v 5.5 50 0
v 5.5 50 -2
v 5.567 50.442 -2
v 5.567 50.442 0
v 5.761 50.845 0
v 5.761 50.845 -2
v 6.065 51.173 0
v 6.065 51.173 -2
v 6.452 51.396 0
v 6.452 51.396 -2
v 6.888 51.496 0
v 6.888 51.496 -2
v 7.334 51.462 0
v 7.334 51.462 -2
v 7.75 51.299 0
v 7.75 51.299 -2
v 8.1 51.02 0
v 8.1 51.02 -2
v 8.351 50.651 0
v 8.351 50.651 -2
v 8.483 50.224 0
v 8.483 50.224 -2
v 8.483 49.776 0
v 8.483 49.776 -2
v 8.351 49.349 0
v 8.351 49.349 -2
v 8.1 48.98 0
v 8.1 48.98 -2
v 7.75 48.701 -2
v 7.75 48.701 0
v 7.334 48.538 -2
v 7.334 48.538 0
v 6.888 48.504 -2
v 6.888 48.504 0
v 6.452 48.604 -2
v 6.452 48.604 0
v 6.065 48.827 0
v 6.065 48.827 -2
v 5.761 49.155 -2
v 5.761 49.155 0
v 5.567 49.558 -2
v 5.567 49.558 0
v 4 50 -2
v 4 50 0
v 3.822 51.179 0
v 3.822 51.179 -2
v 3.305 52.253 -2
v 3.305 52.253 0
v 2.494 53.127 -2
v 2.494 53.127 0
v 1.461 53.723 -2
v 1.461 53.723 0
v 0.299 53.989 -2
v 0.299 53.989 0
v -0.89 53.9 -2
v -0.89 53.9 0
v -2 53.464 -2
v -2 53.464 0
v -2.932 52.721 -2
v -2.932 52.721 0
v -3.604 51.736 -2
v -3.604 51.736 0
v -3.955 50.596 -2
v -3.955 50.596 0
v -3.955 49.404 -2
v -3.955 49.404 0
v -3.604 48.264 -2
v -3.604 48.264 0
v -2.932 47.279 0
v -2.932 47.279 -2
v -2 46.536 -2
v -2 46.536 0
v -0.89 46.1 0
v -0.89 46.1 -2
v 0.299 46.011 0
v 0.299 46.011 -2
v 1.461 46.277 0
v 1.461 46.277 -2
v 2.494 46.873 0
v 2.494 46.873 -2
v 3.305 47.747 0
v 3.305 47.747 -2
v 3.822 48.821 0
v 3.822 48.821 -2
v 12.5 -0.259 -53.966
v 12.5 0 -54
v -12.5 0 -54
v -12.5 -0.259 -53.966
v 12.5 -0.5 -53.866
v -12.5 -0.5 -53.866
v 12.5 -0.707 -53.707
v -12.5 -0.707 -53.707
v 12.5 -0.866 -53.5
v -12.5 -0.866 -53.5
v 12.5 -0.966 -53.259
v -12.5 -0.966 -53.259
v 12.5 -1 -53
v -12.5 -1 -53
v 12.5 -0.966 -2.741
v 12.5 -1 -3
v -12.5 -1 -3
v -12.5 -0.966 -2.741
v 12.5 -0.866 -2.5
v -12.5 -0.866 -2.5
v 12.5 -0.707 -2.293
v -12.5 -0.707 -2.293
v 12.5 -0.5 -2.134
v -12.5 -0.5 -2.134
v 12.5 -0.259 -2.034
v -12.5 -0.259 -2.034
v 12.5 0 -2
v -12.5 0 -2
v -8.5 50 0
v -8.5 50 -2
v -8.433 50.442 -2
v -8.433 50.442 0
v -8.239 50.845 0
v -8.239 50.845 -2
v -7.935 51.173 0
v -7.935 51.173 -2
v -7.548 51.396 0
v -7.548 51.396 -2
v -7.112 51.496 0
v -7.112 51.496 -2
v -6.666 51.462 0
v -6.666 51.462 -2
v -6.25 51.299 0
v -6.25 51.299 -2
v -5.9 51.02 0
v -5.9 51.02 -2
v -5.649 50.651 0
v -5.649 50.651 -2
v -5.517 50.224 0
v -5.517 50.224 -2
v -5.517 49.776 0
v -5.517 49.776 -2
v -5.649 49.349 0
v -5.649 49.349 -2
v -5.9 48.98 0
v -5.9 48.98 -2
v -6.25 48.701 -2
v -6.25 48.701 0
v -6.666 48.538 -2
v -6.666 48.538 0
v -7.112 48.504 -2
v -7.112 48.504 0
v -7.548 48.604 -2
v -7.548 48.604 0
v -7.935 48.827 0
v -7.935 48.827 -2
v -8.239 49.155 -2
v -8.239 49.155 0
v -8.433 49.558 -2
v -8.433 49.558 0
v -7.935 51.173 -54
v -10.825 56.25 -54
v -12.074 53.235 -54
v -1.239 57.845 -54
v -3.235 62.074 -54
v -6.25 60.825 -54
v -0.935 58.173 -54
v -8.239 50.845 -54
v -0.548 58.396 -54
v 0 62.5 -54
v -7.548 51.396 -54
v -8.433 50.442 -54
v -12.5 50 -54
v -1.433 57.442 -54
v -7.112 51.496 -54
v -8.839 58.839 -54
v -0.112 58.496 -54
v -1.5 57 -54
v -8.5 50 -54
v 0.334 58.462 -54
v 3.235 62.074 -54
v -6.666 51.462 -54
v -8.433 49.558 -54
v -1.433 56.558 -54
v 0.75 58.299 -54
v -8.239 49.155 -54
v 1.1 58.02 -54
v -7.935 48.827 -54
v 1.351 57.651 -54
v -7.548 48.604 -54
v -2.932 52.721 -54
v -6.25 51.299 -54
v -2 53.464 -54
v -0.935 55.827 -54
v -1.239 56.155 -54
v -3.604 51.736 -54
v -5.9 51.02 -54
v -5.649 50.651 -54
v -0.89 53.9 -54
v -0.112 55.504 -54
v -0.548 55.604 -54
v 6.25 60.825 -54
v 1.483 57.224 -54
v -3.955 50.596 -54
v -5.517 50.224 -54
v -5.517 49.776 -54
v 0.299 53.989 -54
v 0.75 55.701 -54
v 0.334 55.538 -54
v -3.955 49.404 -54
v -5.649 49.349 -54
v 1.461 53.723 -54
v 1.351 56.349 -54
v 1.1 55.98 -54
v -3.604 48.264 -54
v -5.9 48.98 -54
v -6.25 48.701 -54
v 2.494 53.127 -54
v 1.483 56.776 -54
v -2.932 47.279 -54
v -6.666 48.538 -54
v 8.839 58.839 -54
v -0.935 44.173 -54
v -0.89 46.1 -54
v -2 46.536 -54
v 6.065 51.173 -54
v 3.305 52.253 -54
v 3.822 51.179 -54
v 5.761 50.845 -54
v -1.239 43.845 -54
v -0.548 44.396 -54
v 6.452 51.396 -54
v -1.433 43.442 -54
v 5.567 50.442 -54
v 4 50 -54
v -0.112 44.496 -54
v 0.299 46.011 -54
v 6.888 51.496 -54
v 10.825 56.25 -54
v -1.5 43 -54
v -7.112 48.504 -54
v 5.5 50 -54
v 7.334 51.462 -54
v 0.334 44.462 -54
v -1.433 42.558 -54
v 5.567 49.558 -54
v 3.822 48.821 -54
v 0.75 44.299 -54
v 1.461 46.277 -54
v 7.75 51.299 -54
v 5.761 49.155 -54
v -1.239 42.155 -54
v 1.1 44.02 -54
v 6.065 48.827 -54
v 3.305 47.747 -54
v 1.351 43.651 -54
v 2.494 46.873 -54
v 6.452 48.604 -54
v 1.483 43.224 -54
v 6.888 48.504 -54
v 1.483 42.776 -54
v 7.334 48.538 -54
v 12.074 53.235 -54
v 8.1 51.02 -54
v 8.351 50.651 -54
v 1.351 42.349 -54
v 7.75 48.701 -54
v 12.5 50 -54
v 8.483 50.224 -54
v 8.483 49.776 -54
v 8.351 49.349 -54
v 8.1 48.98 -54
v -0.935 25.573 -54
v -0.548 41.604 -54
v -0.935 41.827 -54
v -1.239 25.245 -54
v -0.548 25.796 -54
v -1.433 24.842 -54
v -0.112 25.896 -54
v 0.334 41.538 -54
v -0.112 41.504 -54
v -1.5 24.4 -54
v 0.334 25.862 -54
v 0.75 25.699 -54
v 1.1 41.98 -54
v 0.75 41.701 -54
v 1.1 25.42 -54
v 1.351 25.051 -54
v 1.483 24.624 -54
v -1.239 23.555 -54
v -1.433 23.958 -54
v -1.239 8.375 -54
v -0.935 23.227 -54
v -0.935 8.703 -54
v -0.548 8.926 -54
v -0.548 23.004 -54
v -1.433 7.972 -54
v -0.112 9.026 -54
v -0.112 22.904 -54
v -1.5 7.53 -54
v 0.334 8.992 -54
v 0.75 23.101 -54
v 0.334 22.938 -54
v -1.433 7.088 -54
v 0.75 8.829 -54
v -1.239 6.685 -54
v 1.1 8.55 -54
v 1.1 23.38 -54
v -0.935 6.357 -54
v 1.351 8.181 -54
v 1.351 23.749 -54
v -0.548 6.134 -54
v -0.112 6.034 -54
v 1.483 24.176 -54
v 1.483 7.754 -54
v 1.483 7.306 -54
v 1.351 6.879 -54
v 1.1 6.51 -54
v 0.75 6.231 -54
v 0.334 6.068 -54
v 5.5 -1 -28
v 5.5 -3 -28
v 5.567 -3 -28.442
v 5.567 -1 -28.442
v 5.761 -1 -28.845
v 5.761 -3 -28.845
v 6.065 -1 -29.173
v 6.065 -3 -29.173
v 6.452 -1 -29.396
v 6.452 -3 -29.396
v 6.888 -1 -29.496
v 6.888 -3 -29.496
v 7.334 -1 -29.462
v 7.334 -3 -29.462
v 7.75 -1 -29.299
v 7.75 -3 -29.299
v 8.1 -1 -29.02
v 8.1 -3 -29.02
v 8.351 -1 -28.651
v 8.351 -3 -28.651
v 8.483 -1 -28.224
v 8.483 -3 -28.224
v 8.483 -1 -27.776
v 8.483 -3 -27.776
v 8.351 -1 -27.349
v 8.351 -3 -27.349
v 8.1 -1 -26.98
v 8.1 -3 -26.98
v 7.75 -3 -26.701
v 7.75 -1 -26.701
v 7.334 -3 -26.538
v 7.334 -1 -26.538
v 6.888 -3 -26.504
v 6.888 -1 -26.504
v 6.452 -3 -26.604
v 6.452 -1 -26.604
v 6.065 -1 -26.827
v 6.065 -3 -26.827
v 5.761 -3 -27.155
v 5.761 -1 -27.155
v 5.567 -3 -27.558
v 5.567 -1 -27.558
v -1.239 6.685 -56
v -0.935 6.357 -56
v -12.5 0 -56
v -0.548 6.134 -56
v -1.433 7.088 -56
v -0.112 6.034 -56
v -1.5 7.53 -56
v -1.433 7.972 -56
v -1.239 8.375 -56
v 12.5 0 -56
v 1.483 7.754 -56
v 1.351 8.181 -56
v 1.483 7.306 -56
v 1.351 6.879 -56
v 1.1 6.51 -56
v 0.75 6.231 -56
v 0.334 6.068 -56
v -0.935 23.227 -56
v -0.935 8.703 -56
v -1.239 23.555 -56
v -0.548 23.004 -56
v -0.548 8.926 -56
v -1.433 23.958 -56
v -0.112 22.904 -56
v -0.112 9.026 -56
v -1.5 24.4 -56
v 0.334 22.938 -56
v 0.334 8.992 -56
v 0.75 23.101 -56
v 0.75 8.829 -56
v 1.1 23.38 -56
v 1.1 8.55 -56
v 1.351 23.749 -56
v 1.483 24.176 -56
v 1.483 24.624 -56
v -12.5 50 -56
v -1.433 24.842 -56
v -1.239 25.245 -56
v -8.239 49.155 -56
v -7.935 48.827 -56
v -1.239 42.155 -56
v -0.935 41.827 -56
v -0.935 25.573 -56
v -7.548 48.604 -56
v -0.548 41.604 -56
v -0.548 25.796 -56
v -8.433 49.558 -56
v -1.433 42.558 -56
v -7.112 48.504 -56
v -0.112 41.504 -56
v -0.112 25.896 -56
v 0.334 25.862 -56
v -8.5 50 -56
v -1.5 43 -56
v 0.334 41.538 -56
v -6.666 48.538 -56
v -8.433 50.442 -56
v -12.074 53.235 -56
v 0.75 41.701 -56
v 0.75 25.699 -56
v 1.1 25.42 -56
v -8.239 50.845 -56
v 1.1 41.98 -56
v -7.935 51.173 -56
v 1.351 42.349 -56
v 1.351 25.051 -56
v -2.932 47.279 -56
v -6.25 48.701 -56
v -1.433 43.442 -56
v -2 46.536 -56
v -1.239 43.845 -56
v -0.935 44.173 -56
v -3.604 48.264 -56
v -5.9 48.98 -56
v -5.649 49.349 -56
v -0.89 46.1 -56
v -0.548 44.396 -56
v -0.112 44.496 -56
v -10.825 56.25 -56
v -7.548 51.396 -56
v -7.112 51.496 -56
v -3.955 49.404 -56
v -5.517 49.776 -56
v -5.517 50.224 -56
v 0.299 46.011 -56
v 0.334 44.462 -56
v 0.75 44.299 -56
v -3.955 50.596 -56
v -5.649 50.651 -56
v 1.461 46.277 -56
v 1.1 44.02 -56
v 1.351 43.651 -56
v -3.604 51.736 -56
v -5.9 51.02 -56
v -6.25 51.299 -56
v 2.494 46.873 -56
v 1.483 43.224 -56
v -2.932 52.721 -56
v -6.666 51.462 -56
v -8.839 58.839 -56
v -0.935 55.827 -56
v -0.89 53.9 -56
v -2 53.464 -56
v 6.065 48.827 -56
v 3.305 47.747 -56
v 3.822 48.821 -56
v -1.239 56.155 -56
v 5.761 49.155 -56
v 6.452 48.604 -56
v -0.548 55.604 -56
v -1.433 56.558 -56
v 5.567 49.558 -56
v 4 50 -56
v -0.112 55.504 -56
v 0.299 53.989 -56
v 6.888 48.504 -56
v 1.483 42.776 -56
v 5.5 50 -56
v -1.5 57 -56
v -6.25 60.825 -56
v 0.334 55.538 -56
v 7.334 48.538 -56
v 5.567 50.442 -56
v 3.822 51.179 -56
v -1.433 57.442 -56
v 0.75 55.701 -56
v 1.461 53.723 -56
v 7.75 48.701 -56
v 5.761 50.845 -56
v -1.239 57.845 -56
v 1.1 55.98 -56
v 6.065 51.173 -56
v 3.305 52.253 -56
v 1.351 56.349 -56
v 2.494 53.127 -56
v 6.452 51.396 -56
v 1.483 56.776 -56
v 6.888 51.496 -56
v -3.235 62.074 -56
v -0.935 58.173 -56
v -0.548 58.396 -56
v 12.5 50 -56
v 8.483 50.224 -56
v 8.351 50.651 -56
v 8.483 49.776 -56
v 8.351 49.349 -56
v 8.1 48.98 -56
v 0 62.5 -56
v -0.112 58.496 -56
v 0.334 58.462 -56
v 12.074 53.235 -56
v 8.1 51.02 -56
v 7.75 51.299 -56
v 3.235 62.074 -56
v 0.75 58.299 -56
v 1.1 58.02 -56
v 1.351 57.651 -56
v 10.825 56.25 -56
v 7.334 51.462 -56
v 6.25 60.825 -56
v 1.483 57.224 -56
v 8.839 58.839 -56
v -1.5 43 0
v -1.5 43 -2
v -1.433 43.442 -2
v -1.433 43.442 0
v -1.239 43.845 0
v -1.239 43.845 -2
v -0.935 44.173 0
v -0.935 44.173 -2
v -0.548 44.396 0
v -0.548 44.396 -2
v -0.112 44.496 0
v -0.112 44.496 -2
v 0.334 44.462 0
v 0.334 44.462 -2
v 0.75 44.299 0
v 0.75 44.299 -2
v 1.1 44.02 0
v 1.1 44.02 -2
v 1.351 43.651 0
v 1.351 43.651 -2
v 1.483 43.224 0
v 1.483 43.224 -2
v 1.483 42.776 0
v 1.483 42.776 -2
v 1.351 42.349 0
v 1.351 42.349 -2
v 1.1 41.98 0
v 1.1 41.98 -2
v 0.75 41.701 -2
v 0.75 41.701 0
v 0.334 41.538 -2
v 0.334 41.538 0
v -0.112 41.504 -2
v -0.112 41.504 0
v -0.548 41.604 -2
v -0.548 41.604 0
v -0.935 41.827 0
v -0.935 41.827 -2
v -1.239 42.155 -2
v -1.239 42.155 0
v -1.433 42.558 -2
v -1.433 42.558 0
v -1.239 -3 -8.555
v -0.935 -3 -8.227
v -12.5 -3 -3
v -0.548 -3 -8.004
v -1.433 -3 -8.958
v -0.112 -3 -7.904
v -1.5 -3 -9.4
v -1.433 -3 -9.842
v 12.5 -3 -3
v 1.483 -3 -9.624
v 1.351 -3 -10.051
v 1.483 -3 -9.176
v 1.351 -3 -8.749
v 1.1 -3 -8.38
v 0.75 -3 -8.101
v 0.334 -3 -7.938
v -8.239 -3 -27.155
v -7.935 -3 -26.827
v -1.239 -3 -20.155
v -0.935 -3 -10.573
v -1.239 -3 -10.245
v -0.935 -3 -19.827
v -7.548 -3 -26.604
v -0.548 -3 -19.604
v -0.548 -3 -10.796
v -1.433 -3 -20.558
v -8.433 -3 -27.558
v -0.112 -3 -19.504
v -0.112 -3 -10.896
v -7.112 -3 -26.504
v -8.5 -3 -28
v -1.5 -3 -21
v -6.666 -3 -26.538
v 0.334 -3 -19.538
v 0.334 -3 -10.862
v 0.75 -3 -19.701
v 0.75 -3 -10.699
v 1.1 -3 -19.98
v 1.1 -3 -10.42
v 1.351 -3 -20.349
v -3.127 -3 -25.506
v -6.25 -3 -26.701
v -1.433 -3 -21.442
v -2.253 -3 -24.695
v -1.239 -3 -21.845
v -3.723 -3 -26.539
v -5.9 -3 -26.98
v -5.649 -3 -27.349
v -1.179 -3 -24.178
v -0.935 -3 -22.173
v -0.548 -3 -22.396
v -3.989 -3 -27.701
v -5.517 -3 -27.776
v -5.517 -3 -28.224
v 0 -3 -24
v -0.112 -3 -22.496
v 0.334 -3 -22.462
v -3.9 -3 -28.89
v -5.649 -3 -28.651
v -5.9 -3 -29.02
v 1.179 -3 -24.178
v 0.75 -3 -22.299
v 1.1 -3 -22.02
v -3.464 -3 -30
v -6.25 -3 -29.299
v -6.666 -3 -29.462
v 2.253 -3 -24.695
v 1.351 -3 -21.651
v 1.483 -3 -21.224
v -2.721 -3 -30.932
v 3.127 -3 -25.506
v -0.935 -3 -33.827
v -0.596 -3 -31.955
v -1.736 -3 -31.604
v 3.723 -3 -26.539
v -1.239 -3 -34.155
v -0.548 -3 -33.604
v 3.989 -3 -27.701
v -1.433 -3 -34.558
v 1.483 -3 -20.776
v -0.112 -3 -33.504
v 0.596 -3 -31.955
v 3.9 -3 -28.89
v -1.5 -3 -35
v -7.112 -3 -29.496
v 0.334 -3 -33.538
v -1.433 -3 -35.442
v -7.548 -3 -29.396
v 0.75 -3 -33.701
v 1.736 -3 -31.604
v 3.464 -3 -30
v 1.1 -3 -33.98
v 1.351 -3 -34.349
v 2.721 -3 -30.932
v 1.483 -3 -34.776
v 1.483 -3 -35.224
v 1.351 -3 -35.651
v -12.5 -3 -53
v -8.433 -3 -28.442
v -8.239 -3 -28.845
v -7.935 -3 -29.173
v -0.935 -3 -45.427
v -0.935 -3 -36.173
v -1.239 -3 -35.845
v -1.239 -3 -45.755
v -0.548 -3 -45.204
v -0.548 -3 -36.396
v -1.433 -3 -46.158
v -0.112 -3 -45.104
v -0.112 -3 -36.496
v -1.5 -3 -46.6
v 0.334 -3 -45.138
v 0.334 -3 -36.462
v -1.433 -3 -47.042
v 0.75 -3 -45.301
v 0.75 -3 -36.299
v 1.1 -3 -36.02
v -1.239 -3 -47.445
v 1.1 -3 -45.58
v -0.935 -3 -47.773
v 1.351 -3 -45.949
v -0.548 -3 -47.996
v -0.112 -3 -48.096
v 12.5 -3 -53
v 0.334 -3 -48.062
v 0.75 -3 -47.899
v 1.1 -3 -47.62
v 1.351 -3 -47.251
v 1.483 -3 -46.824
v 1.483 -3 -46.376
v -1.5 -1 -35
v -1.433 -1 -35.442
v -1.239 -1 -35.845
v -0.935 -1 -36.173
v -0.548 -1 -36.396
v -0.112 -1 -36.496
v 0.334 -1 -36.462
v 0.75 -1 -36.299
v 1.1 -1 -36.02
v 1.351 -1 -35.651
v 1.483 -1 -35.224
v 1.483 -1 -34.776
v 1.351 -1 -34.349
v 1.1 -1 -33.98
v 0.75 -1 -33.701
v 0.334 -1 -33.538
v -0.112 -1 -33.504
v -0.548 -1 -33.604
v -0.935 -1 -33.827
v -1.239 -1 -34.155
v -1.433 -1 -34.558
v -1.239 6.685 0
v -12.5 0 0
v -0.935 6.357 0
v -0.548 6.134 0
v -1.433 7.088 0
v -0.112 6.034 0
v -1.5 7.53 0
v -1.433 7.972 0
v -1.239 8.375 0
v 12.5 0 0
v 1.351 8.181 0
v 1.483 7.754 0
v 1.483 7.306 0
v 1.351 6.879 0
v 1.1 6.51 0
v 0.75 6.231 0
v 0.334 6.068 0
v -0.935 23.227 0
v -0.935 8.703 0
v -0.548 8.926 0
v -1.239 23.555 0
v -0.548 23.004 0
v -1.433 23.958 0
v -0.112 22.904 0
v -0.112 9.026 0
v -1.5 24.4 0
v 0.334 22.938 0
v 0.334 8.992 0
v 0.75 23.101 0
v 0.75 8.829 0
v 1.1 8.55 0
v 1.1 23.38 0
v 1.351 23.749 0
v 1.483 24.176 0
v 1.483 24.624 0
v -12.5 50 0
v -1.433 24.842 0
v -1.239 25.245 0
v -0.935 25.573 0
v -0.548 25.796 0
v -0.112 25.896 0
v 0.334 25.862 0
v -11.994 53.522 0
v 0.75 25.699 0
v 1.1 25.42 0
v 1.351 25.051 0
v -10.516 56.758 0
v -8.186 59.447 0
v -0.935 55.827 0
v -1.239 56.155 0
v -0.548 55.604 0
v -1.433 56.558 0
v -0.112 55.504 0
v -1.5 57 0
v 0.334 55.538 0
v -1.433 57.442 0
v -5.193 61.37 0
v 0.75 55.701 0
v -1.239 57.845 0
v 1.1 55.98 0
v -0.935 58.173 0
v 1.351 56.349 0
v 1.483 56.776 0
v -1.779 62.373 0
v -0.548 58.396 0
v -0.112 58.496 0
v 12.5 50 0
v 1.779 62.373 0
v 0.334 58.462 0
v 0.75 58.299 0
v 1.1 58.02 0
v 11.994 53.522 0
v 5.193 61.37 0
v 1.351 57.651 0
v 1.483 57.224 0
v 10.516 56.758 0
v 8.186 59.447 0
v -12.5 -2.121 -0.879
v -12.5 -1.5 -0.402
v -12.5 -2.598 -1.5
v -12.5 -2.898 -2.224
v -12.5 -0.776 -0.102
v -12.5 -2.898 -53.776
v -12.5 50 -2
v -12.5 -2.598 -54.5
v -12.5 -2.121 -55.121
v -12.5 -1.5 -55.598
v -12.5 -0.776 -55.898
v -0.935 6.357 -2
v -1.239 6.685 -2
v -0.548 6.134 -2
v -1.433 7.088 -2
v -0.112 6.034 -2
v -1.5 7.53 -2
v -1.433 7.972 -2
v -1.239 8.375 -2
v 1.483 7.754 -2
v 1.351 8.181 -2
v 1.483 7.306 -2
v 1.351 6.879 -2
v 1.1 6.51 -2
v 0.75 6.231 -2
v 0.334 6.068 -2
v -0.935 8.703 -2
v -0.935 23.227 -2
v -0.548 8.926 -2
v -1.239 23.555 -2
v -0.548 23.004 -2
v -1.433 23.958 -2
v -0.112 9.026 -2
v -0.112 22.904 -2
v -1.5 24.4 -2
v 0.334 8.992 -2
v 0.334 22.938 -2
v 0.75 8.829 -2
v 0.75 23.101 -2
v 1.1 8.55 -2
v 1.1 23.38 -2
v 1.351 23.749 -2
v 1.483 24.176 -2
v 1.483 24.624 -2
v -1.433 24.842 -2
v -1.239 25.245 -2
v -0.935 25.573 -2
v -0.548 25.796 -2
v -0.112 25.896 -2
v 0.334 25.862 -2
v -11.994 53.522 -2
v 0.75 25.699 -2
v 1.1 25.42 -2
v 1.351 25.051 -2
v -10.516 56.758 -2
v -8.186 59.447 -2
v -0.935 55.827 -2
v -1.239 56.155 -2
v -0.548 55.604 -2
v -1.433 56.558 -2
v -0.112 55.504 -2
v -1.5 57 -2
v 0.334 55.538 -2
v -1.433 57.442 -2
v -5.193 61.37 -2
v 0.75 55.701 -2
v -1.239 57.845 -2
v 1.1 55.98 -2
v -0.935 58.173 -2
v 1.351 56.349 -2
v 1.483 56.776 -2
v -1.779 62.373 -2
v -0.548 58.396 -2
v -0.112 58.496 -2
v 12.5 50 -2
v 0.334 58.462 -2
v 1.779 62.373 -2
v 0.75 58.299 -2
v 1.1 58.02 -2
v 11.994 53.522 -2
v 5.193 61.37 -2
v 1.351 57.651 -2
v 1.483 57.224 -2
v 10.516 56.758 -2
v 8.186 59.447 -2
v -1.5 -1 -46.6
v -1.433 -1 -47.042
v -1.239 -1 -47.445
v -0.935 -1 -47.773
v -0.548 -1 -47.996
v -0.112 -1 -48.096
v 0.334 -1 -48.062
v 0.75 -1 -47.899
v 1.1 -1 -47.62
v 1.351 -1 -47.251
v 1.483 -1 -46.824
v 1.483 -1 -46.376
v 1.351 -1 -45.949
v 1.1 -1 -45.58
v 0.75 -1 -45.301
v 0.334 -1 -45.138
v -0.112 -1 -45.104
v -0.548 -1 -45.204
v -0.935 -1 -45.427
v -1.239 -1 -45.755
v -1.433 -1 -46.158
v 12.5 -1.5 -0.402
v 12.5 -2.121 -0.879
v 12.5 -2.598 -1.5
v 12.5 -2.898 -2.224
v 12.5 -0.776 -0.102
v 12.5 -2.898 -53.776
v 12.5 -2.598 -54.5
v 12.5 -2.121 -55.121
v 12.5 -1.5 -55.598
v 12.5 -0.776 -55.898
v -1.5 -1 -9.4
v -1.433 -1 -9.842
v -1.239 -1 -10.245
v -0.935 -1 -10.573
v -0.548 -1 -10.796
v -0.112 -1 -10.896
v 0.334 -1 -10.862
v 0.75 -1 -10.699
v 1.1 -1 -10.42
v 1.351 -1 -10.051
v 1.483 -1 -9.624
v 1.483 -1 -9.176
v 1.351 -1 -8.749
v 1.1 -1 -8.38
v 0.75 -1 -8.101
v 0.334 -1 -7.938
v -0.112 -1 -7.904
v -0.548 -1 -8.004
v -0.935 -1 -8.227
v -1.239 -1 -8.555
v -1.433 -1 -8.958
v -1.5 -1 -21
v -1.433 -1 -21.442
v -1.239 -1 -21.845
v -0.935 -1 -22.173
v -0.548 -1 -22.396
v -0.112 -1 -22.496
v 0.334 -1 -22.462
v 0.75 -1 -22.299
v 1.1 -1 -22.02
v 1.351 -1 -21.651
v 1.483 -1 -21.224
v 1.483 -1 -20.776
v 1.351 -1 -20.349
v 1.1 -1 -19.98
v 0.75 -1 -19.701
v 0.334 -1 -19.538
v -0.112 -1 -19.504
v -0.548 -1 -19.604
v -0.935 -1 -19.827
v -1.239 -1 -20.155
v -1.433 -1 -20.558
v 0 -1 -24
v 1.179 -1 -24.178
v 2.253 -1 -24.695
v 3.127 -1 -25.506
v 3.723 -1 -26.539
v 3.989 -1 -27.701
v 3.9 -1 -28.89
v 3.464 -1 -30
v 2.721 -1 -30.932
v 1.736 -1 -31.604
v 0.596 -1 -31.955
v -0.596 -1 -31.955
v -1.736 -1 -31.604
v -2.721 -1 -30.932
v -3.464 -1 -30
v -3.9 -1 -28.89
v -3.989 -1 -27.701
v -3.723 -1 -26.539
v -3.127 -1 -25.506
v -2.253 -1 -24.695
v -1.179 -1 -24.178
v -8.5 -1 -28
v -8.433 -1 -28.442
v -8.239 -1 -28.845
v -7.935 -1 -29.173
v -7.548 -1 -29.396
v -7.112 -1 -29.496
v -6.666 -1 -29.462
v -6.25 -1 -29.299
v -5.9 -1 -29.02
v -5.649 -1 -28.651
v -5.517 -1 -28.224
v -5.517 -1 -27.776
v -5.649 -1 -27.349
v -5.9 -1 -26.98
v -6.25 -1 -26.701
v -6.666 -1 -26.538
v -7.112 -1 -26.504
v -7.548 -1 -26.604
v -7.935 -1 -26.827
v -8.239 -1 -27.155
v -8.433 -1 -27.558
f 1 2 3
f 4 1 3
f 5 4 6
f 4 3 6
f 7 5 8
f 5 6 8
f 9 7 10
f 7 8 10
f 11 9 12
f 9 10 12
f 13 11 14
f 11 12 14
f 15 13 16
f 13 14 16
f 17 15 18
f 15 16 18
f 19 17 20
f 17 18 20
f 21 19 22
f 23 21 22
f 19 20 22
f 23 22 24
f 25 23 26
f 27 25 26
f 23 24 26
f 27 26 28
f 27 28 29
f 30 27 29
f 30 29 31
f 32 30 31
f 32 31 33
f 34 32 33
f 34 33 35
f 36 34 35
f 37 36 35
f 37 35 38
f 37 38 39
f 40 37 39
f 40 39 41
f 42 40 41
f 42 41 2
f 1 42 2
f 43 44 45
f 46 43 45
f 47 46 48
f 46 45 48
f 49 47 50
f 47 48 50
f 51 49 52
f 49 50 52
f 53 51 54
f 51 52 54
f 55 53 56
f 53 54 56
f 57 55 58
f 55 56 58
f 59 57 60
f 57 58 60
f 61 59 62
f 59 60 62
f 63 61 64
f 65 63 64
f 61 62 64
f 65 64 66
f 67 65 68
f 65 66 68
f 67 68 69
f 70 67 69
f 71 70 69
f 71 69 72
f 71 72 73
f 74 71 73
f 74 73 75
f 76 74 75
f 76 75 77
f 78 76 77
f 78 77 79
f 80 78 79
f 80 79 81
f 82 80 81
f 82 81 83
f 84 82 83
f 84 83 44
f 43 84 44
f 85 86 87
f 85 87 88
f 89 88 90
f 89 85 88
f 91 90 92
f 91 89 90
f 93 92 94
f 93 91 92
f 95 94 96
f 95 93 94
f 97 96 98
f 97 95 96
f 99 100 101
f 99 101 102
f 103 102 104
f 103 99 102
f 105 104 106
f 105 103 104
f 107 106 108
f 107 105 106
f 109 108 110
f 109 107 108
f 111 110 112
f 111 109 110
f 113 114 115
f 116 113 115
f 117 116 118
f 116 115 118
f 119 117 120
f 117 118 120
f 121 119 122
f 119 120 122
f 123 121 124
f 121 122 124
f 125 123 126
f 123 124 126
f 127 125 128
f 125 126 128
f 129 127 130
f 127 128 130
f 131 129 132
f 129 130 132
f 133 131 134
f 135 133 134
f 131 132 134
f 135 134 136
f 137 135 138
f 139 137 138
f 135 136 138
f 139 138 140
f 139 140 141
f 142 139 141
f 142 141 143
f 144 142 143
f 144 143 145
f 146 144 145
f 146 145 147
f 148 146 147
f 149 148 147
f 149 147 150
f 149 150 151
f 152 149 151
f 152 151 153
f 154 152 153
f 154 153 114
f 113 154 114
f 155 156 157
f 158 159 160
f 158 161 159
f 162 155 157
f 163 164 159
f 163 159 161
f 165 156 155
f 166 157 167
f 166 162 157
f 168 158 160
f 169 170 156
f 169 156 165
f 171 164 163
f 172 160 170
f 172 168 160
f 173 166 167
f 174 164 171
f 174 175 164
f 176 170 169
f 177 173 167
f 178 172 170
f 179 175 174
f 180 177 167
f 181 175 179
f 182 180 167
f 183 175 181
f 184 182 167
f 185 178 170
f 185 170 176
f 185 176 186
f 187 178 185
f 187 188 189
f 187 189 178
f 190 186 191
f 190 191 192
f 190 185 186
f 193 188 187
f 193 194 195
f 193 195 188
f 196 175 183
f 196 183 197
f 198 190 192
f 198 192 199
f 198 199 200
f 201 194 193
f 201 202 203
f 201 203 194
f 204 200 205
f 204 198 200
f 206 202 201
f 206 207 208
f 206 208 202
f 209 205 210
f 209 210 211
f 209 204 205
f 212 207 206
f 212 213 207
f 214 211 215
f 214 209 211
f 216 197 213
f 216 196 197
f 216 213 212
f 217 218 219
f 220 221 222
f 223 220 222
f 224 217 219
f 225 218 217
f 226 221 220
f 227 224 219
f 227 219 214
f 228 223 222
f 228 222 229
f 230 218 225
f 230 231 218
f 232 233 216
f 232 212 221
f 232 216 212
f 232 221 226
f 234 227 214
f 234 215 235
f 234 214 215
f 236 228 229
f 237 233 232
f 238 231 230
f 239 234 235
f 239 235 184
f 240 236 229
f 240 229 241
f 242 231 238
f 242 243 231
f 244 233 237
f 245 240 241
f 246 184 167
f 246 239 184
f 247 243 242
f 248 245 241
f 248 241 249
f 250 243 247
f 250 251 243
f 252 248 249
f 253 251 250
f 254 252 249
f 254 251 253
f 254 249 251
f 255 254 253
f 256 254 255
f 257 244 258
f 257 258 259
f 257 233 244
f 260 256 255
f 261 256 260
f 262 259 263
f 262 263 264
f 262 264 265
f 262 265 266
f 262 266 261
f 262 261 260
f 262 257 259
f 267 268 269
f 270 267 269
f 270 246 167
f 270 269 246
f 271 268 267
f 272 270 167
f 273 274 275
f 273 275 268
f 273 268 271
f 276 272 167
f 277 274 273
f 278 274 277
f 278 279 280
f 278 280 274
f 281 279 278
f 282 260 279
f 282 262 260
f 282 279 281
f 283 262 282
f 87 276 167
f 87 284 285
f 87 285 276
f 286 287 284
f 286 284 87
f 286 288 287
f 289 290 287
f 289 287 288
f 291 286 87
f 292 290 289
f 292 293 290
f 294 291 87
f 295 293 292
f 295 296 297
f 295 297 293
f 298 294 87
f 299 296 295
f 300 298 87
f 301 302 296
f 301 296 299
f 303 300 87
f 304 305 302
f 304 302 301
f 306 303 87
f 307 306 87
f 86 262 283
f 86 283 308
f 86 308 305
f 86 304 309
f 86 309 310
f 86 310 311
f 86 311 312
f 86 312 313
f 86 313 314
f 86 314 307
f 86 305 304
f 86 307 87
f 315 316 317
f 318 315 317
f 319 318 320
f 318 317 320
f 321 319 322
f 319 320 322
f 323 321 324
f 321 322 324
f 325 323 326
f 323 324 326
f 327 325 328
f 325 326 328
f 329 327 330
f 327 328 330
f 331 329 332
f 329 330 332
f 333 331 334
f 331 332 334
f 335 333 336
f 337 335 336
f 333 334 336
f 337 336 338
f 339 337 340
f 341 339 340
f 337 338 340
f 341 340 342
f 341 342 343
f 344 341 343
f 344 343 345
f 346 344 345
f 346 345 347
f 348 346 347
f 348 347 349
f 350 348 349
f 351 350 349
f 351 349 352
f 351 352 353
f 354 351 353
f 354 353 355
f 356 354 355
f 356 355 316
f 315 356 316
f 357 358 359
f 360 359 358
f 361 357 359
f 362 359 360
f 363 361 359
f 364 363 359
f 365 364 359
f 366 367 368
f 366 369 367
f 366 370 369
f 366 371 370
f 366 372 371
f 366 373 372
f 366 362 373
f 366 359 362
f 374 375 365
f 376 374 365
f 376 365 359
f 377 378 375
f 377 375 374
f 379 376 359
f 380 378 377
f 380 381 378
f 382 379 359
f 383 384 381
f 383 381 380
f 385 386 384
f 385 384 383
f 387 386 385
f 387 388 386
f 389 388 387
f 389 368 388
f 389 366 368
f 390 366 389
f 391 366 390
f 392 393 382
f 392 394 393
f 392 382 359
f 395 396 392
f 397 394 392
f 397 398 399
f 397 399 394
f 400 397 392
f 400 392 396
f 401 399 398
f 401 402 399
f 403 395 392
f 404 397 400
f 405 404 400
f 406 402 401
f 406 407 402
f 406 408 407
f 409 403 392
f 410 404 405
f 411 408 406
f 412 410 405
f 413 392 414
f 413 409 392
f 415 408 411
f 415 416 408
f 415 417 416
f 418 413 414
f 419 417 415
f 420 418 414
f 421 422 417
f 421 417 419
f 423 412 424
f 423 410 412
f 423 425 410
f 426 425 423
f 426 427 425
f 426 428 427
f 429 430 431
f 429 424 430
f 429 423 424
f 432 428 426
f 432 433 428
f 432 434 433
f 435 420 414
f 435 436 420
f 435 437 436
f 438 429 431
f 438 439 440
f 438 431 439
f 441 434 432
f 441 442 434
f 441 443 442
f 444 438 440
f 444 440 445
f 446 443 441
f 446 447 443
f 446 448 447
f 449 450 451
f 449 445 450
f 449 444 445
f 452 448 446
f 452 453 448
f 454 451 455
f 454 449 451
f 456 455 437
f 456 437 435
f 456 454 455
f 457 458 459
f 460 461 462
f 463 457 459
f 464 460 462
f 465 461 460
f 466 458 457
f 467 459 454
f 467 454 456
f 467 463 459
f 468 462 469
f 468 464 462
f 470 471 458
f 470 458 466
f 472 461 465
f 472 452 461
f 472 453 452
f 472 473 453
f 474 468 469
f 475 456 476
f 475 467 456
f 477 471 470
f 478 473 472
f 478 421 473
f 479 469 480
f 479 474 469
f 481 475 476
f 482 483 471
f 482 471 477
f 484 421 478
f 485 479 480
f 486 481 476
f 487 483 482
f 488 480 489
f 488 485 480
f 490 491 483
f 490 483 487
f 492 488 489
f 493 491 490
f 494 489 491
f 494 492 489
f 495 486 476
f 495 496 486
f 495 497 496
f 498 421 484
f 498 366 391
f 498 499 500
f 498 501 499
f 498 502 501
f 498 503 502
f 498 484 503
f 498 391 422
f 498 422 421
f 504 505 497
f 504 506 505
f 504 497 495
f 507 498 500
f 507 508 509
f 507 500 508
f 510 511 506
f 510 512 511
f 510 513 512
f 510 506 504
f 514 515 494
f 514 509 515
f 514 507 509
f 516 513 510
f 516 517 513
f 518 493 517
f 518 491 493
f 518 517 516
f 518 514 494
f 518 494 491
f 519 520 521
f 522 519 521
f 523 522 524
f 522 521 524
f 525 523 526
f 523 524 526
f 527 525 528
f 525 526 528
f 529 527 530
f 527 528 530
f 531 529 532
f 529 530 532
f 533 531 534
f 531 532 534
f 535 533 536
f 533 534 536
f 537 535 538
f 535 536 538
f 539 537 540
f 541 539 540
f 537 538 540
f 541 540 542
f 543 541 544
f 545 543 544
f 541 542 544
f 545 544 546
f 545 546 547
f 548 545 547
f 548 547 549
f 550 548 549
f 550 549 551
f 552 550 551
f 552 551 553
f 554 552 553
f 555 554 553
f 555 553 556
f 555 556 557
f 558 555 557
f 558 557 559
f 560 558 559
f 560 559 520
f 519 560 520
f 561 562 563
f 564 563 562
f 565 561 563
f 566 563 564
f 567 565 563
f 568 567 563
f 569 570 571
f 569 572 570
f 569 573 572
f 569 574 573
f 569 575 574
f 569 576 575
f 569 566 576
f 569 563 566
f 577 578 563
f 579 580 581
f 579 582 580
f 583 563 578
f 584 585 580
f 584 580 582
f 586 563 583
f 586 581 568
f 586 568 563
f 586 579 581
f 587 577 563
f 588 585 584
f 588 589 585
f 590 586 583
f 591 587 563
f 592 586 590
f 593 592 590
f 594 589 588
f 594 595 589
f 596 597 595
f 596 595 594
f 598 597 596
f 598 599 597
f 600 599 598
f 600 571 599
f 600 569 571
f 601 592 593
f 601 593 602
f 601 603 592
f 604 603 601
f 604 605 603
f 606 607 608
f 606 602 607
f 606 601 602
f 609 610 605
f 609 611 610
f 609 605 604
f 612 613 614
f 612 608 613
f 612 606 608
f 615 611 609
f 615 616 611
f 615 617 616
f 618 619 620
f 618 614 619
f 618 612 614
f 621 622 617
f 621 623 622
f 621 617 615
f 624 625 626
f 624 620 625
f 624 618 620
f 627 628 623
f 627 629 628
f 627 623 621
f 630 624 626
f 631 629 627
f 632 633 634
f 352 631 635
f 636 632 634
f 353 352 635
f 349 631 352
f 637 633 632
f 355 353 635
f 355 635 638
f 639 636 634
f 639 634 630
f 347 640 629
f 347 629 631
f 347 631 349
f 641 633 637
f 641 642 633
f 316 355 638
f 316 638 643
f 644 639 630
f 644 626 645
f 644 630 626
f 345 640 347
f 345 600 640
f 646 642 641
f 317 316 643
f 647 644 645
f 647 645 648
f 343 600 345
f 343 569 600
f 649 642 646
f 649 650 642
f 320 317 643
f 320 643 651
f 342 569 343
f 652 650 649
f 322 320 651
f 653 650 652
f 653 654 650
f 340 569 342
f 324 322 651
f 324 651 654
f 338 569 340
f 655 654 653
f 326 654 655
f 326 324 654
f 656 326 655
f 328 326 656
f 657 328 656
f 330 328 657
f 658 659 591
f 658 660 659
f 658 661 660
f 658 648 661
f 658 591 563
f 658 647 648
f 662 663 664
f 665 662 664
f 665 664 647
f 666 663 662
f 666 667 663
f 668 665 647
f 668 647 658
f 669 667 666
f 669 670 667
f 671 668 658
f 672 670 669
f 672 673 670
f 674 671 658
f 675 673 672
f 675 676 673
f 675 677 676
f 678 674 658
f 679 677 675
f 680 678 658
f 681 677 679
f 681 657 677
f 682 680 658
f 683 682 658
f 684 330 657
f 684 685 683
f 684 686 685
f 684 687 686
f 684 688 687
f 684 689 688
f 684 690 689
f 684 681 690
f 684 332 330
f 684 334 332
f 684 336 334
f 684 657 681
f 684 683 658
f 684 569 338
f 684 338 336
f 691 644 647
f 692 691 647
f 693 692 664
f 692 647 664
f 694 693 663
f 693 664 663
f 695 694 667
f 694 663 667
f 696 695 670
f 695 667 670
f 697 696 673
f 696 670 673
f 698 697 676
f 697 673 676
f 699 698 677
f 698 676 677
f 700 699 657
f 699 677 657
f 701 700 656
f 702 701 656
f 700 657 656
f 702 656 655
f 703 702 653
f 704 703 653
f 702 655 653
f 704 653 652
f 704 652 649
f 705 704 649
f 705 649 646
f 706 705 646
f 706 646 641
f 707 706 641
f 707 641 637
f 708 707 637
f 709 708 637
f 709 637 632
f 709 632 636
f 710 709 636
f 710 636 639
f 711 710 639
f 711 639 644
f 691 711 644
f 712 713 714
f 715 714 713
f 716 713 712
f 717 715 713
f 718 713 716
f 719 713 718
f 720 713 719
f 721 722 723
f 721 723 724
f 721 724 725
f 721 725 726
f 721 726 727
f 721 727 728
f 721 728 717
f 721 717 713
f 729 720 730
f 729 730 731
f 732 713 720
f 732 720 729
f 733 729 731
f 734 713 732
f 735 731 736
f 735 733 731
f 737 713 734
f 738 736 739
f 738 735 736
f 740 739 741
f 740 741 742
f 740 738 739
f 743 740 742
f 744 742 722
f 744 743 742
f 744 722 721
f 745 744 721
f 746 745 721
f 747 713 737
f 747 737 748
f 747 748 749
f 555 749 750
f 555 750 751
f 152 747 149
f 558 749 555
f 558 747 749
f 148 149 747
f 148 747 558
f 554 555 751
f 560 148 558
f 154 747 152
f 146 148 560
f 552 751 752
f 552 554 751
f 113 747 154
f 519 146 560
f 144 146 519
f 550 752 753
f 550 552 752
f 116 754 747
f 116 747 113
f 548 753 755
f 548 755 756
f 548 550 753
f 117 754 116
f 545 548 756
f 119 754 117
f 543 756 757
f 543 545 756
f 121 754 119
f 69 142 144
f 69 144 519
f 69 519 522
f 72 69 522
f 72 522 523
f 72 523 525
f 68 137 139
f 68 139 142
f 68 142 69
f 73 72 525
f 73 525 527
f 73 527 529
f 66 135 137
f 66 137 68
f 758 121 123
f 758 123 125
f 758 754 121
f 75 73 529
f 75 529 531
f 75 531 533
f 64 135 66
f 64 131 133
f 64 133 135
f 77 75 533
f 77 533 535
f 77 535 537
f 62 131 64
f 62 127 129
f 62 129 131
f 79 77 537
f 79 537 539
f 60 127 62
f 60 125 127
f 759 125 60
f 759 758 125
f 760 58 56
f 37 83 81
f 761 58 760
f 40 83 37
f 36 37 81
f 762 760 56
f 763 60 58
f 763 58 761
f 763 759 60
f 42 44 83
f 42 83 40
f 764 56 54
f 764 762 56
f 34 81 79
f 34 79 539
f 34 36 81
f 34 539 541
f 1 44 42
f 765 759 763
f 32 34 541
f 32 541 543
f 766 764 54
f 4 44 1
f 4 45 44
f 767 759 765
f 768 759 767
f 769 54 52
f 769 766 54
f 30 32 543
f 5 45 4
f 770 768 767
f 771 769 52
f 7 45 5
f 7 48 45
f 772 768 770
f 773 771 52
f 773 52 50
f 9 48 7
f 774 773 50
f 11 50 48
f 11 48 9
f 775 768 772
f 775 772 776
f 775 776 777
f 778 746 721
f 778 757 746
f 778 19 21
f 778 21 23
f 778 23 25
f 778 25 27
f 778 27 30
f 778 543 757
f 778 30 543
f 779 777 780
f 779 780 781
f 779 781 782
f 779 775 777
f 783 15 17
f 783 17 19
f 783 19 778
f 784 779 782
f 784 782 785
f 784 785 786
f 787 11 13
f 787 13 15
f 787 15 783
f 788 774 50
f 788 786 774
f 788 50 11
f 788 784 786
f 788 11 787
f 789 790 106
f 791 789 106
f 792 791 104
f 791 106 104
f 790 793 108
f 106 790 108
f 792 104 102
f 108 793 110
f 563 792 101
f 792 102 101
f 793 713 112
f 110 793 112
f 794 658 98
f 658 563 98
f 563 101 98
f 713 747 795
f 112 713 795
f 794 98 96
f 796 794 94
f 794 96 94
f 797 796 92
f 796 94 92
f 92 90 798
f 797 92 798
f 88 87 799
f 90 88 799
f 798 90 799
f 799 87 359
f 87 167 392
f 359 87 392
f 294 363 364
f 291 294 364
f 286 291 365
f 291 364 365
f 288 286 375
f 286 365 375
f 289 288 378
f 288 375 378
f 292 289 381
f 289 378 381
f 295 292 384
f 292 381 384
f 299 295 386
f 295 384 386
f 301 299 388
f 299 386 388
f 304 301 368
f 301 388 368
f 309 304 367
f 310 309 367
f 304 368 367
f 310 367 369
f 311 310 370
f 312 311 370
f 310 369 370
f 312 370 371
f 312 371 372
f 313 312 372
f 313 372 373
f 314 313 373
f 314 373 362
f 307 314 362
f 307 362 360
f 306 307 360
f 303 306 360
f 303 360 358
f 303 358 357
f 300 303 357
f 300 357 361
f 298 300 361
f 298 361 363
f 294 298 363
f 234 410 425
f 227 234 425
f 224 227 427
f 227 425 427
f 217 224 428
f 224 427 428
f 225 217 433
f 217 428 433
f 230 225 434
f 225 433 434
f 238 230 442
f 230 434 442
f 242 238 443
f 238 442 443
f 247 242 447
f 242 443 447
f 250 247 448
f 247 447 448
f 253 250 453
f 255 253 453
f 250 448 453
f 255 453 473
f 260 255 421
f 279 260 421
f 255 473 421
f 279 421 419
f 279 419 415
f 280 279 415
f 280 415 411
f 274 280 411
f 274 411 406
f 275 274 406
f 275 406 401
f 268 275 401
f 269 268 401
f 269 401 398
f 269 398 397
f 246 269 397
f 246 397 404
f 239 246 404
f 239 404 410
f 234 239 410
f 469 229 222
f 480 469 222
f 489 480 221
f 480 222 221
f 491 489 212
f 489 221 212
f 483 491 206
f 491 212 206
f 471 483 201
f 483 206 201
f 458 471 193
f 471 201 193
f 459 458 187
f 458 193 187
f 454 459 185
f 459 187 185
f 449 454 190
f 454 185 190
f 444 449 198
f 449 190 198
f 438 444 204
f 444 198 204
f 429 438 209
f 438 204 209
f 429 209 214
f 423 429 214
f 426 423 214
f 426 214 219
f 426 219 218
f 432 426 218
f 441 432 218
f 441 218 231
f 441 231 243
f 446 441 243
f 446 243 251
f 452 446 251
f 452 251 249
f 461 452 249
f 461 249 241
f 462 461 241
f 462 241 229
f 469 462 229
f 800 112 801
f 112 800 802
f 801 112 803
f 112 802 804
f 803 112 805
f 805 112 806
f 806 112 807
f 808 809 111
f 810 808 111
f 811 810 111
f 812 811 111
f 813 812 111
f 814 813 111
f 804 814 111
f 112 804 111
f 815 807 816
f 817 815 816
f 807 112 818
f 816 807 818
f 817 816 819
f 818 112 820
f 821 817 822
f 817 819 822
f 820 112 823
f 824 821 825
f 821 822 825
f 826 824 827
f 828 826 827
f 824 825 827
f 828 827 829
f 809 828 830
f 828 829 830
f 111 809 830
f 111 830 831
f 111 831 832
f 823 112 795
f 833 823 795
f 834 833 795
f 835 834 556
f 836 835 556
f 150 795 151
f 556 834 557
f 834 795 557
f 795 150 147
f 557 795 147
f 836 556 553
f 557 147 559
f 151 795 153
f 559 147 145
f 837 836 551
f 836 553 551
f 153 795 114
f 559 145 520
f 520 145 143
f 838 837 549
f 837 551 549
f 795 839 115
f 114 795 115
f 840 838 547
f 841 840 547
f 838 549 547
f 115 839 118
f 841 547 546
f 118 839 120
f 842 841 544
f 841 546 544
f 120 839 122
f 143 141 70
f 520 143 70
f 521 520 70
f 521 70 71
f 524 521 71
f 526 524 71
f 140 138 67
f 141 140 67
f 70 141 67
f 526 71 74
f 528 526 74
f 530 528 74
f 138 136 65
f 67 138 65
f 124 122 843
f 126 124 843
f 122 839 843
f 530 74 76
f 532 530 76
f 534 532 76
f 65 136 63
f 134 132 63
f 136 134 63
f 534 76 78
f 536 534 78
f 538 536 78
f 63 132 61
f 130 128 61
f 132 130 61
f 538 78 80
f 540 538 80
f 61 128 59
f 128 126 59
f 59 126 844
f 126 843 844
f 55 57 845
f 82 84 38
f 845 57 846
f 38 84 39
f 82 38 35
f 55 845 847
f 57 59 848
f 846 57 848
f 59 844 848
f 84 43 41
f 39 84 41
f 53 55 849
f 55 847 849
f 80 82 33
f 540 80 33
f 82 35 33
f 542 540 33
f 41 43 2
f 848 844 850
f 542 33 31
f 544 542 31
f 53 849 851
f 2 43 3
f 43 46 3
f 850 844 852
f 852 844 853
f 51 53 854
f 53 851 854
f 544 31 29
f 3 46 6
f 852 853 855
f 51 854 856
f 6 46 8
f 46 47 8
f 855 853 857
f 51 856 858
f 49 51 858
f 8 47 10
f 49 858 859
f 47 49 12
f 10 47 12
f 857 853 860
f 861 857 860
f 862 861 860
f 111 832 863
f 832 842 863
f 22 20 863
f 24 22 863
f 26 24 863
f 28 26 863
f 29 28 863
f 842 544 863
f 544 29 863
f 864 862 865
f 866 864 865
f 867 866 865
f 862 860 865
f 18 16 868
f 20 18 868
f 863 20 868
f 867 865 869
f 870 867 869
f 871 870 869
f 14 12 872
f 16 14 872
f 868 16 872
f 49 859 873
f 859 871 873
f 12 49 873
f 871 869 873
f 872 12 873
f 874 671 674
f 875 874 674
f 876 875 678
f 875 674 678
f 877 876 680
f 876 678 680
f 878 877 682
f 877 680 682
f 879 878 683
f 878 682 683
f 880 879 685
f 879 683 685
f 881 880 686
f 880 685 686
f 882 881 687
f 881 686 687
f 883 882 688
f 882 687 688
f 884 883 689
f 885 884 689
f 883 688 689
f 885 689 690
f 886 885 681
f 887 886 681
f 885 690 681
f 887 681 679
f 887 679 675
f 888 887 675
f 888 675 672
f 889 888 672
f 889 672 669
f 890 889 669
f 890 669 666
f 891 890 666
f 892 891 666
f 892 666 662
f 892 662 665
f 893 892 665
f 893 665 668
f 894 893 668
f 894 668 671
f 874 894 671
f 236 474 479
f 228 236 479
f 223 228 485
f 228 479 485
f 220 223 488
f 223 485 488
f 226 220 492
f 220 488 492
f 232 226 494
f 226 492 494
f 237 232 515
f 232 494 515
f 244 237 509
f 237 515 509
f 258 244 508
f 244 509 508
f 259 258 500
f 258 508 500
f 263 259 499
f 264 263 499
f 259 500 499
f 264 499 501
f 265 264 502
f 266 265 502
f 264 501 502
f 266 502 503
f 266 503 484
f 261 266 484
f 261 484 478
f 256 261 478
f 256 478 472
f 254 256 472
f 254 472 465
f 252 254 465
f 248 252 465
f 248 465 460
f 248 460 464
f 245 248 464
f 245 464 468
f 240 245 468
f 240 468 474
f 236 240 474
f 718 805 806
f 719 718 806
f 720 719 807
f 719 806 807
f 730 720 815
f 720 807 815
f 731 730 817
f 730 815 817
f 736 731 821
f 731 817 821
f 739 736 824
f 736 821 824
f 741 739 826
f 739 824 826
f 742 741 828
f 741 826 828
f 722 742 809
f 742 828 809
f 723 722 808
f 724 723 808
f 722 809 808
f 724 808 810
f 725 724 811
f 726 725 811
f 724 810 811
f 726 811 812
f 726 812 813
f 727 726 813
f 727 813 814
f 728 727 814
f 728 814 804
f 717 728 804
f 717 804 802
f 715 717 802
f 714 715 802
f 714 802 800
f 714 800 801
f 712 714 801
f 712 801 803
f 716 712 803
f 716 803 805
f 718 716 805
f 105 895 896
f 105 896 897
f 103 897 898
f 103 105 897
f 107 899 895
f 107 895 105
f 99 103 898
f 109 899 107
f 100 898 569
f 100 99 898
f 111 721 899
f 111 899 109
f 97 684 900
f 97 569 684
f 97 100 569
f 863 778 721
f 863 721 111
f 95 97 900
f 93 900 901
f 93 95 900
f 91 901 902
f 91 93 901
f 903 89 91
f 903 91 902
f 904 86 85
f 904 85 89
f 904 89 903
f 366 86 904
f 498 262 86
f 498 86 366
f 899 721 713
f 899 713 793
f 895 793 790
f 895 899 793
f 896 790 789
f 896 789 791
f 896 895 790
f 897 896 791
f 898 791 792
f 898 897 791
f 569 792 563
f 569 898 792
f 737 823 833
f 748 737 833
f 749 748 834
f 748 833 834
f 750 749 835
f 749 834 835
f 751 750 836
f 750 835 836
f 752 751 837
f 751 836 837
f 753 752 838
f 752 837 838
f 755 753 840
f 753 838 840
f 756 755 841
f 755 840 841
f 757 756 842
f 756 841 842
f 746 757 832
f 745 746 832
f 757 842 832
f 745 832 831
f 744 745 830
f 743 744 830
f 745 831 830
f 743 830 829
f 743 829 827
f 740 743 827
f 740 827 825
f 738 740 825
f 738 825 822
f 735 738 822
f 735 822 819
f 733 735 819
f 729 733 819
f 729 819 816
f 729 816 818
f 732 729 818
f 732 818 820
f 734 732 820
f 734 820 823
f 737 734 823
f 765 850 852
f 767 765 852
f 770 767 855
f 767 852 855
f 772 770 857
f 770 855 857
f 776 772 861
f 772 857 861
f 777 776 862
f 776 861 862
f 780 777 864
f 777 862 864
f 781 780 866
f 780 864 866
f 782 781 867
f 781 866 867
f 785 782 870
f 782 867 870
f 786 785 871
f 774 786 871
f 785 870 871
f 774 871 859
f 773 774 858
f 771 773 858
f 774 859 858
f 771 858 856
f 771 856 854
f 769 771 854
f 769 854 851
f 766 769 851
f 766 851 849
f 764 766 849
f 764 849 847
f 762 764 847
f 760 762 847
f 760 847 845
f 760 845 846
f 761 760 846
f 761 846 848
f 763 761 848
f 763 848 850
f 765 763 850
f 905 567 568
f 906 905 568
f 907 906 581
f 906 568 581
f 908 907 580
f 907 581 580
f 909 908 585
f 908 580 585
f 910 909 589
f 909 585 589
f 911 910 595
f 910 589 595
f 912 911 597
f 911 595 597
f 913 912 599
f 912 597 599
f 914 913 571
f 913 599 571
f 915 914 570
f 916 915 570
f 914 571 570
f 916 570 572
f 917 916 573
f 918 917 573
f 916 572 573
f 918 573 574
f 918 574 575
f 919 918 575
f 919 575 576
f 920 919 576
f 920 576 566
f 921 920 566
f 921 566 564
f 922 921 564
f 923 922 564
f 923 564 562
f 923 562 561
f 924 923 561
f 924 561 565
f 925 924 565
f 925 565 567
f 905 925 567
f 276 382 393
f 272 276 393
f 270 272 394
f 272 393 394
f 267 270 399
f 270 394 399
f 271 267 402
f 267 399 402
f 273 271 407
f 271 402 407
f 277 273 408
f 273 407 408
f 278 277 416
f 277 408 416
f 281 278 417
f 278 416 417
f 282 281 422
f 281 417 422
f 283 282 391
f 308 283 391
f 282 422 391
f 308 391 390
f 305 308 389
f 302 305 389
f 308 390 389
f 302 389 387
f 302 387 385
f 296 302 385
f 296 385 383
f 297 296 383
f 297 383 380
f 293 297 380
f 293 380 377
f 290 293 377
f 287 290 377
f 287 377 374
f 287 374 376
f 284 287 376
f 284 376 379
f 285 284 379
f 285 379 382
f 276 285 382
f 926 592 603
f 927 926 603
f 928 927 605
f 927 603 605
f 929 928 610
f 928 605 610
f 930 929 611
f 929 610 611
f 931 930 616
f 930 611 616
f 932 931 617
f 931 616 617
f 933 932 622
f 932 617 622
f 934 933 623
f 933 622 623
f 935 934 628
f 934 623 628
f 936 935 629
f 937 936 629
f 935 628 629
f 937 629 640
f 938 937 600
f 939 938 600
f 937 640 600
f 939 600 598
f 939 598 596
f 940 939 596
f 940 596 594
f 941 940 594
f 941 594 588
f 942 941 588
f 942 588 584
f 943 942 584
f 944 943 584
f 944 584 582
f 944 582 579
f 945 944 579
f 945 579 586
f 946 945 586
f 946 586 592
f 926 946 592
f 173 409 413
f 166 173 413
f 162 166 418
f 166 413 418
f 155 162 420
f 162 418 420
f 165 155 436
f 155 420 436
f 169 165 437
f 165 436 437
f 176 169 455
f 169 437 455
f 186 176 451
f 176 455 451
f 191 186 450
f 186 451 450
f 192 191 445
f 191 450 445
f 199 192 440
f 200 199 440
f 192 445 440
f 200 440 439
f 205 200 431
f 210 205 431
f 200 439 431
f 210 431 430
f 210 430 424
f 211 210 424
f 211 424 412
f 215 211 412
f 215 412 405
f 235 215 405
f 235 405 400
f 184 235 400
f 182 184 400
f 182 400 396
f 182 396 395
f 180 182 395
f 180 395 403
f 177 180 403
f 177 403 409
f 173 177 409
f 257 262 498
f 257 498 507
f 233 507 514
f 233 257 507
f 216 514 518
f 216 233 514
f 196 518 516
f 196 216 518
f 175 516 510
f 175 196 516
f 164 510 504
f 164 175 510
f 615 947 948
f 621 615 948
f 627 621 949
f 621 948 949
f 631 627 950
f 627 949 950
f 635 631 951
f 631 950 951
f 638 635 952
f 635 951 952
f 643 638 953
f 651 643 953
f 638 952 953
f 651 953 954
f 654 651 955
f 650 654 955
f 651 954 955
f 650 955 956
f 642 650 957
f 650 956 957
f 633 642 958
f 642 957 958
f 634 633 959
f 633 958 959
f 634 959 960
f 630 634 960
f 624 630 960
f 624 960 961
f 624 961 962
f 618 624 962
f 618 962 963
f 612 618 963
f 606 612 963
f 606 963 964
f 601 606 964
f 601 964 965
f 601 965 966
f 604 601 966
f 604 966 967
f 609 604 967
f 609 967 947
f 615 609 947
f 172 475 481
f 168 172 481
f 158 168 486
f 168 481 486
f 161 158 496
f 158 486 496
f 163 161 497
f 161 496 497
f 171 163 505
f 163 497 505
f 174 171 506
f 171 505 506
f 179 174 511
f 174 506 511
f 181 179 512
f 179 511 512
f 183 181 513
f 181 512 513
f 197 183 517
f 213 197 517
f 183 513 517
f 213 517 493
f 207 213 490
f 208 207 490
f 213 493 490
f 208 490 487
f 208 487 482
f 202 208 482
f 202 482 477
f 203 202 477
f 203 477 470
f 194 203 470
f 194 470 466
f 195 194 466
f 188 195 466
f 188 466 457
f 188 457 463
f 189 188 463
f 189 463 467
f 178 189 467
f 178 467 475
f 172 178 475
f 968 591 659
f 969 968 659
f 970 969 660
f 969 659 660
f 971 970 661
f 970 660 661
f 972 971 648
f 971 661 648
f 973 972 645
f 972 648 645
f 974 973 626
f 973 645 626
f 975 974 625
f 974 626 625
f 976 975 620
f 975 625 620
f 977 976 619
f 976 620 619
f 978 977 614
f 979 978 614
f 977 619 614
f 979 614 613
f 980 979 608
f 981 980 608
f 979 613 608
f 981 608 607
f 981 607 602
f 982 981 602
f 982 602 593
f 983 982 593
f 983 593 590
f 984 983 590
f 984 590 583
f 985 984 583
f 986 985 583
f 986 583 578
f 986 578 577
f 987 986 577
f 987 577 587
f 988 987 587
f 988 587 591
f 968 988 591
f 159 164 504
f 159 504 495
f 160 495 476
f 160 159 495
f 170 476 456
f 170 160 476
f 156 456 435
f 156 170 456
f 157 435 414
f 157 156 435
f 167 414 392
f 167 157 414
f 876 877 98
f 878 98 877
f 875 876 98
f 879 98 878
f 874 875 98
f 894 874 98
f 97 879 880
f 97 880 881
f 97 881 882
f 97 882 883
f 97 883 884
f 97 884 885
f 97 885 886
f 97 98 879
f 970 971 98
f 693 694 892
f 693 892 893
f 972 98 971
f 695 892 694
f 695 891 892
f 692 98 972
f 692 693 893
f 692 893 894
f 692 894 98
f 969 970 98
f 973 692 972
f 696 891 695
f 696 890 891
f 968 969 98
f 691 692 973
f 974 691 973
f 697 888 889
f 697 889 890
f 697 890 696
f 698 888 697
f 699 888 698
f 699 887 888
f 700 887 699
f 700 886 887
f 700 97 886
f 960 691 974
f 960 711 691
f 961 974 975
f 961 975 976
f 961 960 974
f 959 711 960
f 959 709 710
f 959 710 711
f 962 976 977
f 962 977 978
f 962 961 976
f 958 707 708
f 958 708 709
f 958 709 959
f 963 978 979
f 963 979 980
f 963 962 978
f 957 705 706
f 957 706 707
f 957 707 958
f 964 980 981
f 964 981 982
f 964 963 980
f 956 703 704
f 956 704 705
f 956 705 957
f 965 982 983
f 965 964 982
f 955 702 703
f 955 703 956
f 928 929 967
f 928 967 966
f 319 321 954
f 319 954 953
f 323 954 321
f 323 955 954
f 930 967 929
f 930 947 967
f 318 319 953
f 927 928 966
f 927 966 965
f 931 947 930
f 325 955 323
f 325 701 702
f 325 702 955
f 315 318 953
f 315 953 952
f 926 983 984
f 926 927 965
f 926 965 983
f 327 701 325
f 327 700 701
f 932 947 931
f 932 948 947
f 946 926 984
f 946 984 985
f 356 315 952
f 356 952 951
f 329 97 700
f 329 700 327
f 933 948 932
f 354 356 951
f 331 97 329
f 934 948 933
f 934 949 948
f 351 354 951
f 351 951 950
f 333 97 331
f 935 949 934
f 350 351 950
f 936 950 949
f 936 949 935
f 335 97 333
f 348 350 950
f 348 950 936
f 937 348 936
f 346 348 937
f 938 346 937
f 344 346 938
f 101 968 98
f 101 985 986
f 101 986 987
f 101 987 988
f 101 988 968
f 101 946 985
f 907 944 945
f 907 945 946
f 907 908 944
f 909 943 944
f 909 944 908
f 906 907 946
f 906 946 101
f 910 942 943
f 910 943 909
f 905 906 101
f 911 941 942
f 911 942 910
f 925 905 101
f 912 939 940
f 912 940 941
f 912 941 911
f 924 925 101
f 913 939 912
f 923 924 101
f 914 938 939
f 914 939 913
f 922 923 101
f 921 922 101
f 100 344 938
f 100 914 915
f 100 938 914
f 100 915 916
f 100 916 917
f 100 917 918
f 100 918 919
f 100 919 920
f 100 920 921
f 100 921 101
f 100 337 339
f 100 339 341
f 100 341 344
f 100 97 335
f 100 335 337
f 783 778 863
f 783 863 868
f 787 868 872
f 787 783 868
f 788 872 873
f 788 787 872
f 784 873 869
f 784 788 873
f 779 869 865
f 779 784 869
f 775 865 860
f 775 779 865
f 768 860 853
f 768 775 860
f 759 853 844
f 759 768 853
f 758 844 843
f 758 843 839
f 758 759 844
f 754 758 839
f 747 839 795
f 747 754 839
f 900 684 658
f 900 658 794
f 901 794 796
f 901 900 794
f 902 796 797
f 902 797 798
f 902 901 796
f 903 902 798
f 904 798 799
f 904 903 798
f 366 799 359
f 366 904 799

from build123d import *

# Parameters (mm, degrees)
BASE_FLANGE1_DEPTH           = 2
EDGE_FLANGE1_DEPTH           = 25
EDGE_FLANGE2_STRIP_W         = 10
EDGE_FLANGE2_STRIP_H         = 2
EDGE_FLANGE2_STRIP_CUT_DEPTH = 25
EDGE_FLANGE2_DEPTH           = 25
CUT_EXTRUDE1_START           = -2
CUT_EXTRUDE1_DEPTH           = 2
SKETCH19_R                   = 4
CUT_EXTRUDE2_DEPTH           = 85.843974447
M3X0_5_TAPPED_HOLE1_D        = 3
SKETCH22_R                   = 4
CUT_EXTRUDE3_DEPTH           = 86.583292762
M3X0_5_TAPPED_HOLE2_D        = 3


# Sheet-metal steps are written as plain solids
with BuildPart() as part:
    # Sketch8 → Base-Flange1 (new body)
    with BuildSketch(Plane.XY):
        with BuildLine():
            Line((-12.5, 0), (12.5, 0))
            Line((12.5, 0), (12.5, 50))
            ThreePointArc((12.5, 50), (0, 62.5), (-12.5, 50))
            Line((-12.5, 50), (-12.5, 0))
        make_face()
    extrude(amount=-BASE_FLANGE1_DEPTH)

    # Edge-Flange1 section (across the edge) → Edge-Flange1 (add)
    with BuildSketch(Plane(origin=(12.5, -1, -2), x_dir=(0, 1, 0), z_dir=(-1, 0, 0))):
        with BuildLine():
            Line((-2, 1), (-2, 52))
            Line((-2, 52), (0, 52))
            Line((0, 52), (0, 1))
            ThreePointArc((0, 1), (0.292893219, 0.292893219), (1, 0))
            Line((1, 0), (1, -2))
            ThreePointArc((1, -2), (-1.121320344, -1.121320344), (-2, 1))
        make_face()
    extrude(amount=EDGE_FLANGE1_DEPTH)

    # Edge-Flange2 strip (across the edge) → Edge-Flange2 strip cut (cut)
    with BuildSketch(Plane(origin=(12.5, -1, -54), x_dir=(0, 0, 1), z_dir=(-1, 0, 0))):
        with Locations((-4, -1)):
            Rectangle(EDGE_FLANGE2_STRIP_W, EDGE_FLANGE2_STRIP_H)
    extrude(amount=EDGE_FLANGE2_STRIP_CUT_DEPTH, mode=Mode.SUBTRACT)

    # Edge-Flange2 section (across the edge) → Edge-Flange2 (add)
    with BuildSketch(Plane(origin=(12.5, -1, -54), x_dir=(0, 0, 1), z_dir=(-1, 0, 0))):
        with BuildLine():
            Line((-2, 1), (-2, 63.5))
            Line((-2, 63.5), (0, 63.5))
            Line((0, 63.5), (0, 1))
            ThreePointArc((0, 1), (0.292893219, 0.292893219), (1, 0))
            Line((1, 0), (1, -2))
            ThreePointArc((1, -2), (-1.121320344, -1.121320344), (-2, 1))
        make_face()
    extrude(amount=EDGE_FLANGE2_DEPTH)

    # Sketch18 → Cut-Extrude1 (cut)
    with BuildSketch(Plane(origin=(0, 0, -56), x_dir=(-1, 0, 0), z_dir=(0, 0, -1)).offset(CUT_EXTRUDE1_START)):
        with BuildLine():
            ThreePointArc((0, 62.5), (8.838834765, 58.838834765), (12.5, 50))
            Line((12.5, 50), (12.5, 62.5))
            Line((12.5, 62.5), (0, 62.5))
        make_face()
        with BuildLine():
            ThreePointArc((-12.5, 50), (-8.838834765, 58.838834765), (0, 62.5))
            Line((0, 62.5), (-12.5, 62.5))
            Line((-12.5, 62.5), (-12.5, 50))
        make_face()
    extrude(amount=CUT_EXTRUDE1_DEPTH, mode=Mode.SUBTRACT)

    # Sketch19 → Cut-Extrude2 (cut, through all)
    with BuildSketch(Plane.XY):
        with Locations((0, 50)):
            Circle(SKETCH19_R)
    extrude(amount=-CUT_EXTRUDE2_DEPTH, mode=Mode.SUBTRACT)

    # M3x0.5 Tapped Hole1 (through all)
    with Locations(Plane.XY):
        with Locations((0, 57), (-7, 50), (0, 43), (7, 50), (0, 24.4), (0, 7.53)):
            Hole(M3X0_5_TAPPED_HOLE1_D / 2)

    # Sketch22 → Cut-Extrude3 (cut, through all)
    with BuildSketch(Plane(origin=(0, -1, 0), x_dir=(1, 0, 0), z_dir=(0, 1, 0))):
        with Locations(Location((0, 28, 0), (0, 0, 270))):
            Circle(SKETCH22_R)
    extrude(amount=-CUT_EXTRUDE3_DEPTH, mode=Mode.SUBTRACT)

    # M3x0.5 Tapped Hole2 (through all)
    with Locations(Plane(origin=(0, -1, 0), x_dir=(1, 0, 0), z_dir=(0, 1, 0))):
        with Locations((7, 28), (-7, 28), (0, 35), (0, 21), (0, 9.4), (0, 46.6)):
            Hole(M3X0_5_TAPPED_HOLE2_D / 2)


solid = part.part
